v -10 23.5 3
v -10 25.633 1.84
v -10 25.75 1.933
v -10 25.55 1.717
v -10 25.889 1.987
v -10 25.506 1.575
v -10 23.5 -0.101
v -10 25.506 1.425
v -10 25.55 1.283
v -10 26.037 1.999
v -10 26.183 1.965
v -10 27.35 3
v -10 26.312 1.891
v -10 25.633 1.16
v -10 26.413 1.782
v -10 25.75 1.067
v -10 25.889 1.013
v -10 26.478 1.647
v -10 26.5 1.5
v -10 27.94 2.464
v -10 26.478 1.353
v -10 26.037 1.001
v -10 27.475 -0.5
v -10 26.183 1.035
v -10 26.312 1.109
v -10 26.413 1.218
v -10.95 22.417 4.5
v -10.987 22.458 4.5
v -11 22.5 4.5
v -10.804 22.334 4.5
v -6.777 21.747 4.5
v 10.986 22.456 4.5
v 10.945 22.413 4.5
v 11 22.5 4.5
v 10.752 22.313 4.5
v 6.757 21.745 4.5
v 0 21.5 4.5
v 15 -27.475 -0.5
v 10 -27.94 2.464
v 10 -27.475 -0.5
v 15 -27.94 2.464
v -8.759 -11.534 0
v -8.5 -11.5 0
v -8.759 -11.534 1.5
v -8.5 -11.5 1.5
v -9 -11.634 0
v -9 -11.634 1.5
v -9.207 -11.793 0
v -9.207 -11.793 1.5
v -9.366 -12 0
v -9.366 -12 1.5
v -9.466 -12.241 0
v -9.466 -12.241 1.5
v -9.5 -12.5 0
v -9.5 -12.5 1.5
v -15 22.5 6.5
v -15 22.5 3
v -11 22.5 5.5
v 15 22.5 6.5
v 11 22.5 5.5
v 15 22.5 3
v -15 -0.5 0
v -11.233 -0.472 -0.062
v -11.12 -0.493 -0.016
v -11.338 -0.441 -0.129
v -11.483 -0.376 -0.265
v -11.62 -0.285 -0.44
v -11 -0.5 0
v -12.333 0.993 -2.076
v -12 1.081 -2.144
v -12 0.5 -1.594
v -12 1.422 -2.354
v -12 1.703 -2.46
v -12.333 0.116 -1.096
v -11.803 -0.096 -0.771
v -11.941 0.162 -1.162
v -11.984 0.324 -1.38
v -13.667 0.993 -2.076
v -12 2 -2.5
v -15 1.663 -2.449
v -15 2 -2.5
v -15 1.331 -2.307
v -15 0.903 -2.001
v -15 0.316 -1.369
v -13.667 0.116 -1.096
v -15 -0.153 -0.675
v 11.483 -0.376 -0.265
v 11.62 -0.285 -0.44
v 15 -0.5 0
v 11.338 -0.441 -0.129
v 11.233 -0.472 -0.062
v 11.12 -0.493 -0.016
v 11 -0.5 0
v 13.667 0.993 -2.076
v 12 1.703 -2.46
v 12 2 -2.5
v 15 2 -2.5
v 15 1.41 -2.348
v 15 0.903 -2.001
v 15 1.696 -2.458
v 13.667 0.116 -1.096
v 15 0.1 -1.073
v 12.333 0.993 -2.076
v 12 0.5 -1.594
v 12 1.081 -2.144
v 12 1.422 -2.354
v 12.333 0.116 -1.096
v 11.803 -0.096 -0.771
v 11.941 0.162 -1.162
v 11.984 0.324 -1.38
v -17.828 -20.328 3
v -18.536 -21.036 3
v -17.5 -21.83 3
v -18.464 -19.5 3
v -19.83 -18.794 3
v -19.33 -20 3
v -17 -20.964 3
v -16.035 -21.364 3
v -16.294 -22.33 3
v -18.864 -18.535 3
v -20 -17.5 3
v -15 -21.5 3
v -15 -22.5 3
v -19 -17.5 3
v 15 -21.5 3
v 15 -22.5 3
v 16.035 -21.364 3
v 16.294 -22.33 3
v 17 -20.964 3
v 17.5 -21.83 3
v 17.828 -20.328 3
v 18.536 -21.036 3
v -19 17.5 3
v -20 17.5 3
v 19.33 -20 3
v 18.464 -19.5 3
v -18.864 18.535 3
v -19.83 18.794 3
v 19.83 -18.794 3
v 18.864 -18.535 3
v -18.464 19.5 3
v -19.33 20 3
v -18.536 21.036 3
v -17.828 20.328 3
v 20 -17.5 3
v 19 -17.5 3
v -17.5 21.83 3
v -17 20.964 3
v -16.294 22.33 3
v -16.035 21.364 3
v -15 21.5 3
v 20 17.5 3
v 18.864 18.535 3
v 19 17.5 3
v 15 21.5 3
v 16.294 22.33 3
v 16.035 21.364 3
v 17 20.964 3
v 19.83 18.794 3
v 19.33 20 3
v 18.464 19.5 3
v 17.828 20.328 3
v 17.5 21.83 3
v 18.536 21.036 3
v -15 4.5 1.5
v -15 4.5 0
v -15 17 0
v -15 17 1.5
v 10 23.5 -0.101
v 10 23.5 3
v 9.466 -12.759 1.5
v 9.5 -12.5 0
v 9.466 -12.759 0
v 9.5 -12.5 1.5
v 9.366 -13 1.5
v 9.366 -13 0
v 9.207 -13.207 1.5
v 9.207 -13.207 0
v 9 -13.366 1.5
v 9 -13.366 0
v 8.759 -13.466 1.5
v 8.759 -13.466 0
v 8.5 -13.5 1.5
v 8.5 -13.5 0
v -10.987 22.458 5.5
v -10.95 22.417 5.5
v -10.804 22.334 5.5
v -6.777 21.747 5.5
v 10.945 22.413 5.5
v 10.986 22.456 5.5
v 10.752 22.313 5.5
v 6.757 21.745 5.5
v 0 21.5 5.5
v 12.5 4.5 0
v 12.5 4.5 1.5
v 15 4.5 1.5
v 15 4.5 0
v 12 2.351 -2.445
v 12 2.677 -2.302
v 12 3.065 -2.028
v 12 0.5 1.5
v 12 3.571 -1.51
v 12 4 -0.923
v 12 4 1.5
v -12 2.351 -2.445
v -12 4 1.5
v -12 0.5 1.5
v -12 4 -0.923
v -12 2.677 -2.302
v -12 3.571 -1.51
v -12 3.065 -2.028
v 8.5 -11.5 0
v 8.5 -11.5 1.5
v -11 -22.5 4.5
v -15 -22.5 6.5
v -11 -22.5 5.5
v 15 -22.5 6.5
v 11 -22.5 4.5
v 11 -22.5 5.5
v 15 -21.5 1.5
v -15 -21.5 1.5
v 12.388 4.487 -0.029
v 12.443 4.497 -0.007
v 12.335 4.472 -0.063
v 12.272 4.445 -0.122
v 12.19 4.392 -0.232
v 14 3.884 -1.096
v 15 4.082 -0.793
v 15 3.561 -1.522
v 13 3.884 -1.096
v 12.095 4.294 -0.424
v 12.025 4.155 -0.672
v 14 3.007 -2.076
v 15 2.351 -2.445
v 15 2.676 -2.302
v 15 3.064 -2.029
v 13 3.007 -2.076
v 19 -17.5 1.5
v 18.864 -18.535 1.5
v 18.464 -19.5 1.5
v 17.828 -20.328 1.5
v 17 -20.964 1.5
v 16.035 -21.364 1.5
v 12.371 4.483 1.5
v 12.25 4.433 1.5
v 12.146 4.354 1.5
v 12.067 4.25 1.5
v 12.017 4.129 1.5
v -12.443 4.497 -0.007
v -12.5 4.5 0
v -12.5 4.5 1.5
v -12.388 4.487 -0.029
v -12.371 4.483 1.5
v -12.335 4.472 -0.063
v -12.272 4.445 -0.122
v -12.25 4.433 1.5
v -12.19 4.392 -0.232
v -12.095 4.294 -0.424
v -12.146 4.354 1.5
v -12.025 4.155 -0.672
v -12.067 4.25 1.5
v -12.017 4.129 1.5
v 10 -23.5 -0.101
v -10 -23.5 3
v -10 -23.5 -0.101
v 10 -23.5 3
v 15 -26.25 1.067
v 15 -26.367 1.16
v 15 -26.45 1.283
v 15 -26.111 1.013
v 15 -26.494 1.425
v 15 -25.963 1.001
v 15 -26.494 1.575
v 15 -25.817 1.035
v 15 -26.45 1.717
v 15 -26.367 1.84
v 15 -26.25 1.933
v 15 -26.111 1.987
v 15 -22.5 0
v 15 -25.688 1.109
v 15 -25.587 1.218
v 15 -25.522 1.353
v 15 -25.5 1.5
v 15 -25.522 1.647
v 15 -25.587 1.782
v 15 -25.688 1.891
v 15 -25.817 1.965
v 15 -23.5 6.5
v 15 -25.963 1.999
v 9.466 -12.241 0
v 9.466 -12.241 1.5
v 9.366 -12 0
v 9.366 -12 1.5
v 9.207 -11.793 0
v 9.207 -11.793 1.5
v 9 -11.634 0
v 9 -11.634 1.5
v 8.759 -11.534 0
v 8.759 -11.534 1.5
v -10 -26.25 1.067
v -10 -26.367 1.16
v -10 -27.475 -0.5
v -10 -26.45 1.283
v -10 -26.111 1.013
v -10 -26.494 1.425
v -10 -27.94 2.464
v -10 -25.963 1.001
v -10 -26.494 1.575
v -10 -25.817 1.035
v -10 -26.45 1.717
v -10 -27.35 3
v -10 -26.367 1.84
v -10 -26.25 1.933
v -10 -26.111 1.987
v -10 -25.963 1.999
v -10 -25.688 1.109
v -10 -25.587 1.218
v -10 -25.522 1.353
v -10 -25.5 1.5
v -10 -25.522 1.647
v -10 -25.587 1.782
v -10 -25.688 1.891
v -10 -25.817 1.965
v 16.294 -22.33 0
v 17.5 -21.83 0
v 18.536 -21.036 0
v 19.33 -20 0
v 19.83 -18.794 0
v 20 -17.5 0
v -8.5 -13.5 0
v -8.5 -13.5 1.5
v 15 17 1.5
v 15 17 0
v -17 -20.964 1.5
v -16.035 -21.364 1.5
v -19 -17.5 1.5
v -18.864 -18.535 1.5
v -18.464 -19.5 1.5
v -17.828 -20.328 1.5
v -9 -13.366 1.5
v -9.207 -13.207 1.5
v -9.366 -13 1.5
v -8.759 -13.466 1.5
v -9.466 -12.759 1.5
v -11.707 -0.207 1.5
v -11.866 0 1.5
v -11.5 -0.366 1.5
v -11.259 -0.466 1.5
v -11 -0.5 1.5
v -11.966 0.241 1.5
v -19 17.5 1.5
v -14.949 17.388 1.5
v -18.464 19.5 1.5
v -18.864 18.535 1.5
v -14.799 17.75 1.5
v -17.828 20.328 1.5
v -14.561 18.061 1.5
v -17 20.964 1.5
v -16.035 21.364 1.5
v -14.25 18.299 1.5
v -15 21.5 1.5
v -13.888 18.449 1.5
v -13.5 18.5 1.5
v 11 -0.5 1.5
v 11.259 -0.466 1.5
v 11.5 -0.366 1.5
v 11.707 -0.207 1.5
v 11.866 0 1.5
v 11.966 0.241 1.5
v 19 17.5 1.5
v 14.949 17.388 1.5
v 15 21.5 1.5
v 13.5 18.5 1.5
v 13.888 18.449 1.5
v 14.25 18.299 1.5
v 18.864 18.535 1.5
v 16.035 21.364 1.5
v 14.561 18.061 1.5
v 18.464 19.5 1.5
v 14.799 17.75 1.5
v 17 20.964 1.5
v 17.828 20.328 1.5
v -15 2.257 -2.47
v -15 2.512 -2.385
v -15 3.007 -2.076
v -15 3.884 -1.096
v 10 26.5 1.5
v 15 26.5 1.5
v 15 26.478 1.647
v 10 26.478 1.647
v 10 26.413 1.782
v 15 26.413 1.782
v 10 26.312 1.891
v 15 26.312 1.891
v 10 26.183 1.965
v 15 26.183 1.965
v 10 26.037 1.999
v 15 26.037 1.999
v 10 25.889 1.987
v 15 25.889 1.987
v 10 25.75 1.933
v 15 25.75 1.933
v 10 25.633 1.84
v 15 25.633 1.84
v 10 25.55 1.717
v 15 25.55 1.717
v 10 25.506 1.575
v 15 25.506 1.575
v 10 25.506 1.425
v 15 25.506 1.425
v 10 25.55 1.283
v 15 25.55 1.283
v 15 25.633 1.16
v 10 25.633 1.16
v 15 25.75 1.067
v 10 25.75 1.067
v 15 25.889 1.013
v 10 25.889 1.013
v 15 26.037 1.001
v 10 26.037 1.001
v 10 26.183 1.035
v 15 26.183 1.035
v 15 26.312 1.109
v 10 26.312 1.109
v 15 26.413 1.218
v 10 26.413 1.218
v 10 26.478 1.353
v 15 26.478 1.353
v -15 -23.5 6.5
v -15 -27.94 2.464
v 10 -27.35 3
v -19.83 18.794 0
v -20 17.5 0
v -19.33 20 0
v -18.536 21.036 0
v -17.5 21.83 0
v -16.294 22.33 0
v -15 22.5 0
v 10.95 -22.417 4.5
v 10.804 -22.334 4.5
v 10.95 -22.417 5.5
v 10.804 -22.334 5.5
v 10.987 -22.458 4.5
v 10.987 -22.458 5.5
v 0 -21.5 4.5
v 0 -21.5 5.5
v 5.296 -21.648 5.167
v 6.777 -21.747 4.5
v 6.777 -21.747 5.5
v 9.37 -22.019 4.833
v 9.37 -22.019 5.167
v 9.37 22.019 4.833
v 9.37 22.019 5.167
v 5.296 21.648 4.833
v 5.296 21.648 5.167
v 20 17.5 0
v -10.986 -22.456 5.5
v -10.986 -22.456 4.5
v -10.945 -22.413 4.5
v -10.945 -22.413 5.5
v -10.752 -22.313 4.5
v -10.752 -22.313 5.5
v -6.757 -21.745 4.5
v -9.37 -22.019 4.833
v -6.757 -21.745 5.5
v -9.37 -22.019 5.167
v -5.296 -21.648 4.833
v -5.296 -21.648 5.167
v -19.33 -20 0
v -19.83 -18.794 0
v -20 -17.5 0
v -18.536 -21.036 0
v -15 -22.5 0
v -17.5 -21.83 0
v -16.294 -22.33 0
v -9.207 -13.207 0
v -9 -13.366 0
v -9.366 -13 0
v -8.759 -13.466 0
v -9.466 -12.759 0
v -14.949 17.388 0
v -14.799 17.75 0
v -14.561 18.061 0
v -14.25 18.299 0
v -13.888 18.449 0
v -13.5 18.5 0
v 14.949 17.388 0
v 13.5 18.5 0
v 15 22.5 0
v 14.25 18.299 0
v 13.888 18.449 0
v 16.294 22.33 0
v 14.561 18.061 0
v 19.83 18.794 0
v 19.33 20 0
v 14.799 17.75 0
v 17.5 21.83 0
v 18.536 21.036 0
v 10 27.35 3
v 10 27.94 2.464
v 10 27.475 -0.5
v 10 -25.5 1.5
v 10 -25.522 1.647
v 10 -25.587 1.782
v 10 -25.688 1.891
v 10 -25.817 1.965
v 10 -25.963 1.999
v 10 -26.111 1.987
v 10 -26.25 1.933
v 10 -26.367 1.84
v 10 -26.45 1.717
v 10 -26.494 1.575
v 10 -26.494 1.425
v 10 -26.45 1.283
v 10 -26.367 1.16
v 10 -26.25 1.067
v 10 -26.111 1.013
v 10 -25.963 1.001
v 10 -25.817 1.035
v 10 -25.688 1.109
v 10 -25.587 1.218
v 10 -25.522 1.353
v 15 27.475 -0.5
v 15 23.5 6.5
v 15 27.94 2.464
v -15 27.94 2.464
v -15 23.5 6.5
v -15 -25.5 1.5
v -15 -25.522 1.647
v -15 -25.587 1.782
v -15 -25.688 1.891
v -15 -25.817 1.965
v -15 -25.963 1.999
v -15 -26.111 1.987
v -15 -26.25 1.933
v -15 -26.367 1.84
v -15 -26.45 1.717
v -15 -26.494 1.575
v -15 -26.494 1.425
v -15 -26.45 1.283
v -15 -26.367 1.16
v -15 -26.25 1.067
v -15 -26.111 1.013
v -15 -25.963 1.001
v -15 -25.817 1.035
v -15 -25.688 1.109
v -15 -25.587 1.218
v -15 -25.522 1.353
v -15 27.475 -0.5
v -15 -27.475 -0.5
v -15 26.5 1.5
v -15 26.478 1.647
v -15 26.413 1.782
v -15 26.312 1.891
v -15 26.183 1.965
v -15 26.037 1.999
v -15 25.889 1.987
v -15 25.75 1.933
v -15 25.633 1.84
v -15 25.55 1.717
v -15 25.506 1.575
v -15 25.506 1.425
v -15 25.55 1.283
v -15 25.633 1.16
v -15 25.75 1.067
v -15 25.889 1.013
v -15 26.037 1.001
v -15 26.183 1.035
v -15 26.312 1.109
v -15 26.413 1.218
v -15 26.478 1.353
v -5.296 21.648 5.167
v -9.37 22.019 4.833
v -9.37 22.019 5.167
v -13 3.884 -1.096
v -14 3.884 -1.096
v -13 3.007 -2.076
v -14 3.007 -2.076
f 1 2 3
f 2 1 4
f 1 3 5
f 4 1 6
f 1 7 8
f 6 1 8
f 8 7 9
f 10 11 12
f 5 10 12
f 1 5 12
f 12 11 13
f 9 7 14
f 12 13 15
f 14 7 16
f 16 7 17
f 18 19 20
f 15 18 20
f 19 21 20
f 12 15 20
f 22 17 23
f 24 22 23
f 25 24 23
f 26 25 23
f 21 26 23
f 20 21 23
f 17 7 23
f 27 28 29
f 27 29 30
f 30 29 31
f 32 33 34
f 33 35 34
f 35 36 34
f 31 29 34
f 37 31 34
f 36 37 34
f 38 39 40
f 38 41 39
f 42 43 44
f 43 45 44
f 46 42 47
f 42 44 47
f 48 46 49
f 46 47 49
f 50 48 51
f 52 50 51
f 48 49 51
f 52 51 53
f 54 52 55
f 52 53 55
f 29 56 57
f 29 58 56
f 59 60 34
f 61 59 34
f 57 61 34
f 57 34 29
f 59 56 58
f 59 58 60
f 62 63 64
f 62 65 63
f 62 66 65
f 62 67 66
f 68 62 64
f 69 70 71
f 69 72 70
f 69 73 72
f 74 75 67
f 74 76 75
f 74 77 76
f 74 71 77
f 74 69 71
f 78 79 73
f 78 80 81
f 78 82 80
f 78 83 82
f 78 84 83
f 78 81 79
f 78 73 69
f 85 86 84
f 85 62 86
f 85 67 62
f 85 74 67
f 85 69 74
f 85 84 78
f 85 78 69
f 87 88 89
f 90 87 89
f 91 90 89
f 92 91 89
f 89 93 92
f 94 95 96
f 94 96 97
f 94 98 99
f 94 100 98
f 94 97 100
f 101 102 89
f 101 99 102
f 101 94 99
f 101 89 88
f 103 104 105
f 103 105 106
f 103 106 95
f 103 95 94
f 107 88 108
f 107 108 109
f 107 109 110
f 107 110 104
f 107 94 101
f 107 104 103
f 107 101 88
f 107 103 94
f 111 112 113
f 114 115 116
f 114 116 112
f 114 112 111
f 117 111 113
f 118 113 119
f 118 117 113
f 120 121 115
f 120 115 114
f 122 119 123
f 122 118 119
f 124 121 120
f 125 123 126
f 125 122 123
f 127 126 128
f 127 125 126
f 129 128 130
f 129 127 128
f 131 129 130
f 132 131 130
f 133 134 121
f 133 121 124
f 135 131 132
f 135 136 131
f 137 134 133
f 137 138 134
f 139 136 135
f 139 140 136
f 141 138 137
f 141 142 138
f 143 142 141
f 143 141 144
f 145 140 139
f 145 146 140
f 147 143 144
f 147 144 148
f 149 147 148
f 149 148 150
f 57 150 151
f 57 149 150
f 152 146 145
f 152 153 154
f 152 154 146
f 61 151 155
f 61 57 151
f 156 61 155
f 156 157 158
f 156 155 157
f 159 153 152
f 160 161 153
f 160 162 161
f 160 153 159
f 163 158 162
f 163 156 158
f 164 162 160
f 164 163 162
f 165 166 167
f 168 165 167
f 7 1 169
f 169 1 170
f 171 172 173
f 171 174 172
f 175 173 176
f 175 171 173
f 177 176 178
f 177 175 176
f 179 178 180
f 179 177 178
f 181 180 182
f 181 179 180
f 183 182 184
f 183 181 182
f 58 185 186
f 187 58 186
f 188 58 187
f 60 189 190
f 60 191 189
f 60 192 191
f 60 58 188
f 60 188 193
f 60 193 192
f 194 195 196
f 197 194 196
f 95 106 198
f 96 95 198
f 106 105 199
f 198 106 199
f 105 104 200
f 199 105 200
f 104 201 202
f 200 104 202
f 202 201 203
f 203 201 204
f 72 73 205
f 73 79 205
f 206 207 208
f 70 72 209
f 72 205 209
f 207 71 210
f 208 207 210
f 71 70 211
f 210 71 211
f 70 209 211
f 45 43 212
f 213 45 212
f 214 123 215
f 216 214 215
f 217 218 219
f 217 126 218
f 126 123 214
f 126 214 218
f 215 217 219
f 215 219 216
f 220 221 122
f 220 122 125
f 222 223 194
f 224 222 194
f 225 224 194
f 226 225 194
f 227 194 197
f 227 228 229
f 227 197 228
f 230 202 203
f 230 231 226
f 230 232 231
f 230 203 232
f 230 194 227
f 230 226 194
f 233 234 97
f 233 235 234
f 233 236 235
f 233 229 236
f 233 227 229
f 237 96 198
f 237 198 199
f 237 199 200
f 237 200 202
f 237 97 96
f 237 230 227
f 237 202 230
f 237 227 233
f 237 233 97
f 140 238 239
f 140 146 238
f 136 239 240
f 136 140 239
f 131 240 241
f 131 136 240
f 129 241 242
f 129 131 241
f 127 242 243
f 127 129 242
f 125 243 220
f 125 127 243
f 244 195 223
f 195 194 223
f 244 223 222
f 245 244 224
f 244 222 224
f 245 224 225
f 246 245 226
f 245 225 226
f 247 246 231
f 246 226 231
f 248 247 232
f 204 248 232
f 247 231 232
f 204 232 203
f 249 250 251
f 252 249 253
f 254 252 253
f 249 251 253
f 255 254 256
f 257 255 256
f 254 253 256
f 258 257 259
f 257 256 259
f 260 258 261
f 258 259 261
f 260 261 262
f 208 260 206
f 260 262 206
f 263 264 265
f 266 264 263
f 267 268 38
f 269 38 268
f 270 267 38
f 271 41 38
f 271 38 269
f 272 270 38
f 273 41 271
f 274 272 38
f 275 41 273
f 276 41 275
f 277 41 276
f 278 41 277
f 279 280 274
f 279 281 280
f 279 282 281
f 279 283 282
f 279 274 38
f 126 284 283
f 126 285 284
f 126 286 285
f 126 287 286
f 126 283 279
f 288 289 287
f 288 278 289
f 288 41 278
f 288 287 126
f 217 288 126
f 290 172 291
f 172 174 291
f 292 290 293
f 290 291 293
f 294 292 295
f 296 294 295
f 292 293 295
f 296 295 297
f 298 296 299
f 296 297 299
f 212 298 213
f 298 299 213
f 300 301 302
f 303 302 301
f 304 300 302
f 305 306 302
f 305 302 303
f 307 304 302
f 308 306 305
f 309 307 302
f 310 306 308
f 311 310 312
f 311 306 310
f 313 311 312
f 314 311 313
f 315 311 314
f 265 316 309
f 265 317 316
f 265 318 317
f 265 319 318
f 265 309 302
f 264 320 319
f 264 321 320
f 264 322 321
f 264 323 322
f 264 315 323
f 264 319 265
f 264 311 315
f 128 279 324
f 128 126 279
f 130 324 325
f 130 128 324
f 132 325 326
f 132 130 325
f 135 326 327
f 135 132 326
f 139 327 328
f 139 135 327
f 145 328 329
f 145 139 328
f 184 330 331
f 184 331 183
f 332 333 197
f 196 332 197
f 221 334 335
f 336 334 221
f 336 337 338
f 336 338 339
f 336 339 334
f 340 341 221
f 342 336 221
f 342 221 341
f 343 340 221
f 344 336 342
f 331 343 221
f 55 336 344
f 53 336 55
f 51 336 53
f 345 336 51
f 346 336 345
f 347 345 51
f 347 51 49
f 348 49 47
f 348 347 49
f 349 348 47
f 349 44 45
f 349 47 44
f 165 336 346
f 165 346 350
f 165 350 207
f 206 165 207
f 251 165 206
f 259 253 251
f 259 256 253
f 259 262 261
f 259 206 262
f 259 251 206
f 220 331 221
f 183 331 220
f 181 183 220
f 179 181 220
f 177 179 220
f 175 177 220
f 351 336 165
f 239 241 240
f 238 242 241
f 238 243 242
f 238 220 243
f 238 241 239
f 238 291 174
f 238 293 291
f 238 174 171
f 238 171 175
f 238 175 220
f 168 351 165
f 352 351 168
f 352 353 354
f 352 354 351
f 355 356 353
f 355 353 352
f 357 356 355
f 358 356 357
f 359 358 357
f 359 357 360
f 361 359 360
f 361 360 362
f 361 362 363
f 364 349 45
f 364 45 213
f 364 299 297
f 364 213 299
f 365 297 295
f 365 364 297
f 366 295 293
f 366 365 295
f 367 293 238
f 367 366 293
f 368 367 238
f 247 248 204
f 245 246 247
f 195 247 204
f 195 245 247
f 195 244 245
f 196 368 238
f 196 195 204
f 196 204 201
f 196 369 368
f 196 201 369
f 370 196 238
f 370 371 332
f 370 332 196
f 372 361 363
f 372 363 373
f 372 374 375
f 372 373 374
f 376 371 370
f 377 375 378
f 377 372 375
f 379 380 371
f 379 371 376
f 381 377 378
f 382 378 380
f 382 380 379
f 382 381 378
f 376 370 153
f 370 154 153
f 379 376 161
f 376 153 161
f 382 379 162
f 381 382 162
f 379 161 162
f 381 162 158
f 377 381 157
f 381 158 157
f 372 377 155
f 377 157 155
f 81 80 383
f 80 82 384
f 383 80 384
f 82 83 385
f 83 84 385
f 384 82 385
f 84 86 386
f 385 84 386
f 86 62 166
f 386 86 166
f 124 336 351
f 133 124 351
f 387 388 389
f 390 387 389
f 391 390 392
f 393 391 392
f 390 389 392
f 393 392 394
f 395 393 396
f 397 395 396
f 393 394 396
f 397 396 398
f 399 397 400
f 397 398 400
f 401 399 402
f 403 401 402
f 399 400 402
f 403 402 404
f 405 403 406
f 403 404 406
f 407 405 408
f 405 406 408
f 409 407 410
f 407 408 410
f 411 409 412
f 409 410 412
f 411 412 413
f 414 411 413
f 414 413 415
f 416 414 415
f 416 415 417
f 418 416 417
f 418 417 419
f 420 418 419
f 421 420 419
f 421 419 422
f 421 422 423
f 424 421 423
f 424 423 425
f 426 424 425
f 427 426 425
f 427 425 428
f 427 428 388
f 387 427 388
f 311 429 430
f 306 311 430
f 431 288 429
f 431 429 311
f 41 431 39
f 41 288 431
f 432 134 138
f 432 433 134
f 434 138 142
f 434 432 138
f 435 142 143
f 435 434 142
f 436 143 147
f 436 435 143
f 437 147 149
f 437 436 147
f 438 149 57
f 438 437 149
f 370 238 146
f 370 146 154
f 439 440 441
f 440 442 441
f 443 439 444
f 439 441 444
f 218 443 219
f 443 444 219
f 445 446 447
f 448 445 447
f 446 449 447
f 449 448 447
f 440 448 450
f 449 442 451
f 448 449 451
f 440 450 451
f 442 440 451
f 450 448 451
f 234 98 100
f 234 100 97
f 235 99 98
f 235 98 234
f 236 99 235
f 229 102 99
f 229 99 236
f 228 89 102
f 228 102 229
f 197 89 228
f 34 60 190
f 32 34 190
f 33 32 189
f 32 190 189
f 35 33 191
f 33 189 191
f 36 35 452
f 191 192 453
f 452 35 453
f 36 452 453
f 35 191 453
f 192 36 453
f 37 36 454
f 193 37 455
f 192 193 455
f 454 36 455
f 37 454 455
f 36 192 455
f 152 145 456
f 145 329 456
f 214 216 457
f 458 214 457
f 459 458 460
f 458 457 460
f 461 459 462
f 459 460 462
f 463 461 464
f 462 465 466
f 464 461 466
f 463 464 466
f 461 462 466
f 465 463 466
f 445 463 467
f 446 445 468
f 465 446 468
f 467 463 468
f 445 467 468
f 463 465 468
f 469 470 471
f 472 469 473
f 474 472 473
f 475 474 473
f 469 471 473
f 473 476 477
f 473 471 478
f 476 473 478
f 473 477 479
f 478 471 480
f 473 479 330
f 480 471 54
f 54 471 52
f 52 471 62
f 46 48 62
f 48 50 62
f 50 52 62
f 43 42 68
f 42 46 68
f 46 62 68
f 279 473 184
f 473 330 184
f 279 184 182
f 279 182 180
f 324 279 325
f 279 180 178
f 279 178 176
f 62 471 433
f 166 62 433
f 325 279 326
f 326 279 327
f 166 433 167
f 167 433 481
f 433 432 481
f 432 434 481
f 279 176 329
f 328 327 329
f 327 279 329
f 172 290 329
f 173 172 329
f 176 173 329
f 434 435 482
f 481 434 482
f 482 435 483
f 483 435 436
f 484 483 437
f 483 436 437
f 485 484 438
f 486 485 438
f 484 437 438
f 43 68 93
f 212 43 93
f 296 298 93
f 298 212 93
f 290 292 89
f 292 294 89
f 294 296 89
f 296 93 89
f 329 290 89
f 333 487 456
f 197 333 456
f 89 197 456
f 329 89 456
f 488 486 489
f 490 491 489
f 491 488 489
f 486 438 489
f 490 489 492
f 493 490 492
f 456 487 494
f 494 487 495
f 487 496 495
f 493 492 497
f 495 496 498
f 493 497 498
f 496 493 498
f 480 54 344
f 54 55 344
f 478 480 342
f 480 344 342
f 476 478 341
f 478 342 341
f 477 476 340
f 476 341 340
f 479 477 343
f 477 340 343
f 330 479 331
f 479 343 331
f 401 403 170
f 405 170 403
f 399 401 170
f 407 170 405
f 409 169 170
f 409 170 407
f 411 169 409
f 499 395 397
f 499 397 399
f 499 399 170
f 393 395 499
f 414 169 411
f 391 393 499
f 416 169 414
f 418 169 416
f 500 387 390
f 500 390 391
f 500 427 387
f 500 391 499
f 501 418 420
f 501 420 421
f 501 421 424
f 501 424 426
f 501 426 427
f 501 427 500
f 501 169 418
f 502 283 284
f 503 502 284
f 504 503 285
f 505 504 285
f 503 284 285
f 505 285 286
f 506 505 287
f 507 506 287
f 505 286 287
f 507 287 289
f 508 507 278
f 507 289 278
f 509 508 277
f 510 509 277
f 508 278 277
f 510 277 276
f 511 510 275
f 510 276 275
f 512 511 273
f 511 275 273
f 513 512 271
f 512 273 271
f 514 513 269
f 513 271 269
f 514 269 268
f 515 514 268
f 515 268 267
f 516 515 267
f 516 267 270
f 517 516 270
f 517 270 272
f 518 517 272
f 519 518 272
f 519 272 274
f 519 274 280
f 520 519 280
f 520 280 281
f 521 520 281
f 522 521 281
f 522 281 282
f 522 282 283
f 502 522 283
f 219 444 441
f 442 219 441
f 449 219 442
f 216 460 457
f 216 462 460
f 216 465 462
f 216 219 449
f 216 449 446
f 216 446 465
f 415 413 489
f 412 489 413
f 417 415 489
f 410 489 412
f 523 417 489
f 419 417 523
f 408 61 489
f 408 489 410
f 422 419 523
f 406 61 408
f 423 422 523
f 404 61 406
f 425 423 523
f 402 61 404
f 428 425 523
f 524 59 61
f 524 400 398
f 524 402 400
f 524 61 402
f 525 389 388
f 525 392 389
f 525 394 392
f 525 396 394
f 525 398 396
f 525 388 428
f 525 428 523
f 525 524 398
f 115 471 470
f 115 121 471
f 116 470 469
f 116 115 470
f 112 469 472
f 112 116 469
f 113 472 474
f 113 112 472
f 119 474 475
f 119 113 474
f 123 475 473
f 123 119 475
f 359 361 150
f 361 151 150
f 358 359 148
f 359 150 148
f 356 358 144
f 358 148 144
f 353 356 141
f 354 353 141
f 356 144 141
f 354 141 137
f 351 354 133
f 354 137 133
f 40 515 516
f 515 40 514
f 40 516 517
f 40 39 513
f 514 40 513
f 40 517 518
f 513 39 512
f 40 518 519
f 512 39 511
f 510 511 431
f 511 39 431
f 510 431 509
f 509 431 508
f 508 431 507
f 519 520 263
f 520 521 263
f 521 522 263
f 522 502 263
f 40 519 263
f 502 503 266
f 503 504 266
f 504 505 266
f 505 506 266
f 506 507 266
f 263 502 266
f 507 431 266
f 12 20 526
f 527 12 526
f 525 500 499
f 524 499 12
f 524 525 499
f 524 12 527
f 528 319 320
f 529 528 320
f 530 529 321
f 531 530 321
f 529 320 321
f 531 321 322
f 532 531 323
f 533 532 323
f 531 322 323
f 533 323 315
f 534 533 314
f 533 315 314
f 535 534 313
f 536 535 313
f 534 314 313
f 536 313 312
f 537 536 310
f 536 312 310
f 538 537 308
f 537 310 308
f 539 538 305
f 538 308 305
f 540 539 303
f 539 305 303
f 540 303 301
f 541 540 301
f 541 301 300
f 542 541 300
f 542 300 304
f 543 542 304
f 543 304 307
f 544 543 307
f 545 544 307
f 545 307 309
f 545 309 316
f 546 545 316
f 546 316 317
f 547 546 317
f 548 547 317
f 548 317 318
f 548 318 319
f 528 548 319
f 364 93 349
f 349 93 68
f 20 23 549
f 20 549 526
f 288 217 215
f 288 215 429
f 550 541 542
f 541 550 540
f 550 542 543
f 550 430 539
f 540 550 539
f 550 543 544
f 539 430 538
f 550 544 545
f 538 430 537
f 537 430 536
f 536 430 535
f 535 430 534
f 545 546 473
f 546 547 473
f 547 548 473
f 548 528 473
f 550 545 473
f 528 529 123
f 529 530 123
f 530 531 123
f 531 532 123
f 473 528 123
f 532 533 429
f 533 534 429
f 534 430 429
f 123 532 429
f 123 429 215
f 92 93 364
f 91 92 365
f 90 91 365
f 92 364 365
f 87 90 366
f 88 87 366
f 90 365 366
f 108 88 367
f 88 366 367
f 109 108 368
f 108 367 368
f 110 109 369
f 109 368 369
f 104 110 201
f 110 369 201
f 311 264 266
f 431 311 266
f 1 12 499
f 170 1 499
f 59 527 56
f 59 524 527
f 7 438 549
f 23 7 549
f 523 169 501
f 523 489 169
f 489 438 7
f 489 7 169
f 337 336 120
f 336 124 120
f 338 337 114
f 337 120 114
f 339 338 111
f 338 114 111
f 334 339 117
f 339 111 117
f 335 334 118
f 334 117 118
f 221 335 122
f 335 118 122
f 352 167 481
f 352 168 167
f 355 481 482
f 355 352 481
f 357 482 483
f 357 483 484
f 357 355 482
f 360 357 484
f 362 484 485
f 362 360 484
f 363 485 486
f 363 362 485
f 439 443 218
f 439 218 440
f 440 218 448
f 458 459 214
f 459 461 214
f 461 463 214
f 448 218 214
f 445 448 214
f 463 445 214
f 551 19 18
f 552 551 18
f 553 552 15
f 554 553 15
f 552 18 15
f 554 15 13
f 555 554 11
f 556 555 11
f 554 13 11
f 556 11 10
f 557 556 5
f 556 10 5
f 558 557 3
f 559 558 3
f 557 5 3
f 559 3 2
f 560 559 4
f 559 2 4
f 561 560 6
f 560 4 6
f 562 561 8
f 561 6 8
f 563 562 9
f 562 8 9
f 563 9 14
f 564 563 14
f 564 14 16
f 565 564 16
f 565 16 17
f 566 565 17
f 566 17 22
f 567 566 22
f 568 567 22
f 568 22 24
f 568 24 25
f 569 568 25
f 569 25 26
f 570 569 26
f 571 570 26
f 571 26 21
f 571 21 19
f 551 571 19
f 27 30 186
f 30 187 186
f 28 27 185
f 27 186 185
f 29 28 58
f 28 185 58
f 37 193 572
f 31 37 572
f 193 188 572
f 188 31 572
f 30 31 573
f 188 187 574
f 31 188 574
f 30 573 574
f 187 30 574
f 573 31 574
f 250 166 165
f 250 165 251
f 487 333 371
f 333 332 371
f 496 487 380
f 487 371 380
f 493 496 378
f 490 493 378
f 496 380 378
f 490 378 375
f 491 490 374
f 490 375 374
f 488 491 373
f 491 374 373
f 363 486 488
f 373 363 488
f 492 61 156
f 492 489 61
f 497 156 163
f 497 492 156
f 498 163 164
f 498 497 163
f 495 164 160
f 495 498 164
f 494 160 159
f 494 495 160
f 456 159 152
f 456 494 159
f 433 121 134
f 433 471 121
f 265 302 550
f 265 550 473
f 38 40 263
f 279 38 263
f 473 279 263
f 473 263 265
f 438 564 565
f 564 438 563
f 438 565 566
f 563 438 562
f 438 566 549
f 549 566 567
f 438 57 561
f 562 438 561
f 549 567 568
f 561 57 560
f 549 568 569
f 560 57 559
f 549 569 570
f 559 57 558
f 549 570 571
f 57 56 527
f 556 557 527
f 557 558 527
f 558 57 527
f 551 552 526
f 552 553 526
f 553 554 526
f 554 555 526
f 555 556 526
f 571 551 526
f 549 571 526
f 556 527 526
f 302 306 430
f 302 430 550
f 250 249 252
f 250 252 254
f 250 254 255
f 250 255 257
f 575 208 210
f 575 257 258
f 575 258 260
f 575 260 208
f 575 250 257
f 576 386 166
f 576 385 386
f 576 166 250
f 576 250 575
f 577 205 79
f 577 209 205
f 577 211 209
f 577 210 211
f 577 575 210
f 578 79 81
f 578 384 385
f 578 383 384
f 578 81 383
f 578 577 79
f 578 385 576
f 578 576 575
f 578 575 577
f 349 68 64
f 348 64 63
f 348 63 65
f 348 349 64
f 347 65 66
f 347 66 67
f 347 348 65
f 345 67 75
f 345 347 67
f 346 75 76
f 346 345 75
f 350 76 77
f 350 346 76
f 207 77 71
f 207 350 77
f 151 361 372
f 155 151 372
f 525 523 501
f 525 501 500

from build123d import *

# Parameters (mm, degrees)
F0_W           = 40
F0_H           = 45
F0_W_2         = 19
F0_H_2         = 2
F0_W_3         = 3
F0_H_3         = 5
F1_DEPTH       = 1.5
F2_DEPTH       = 2.5
F4_DEPTH       = 50
F5_R           = 0.99999
F6_R           = 1.5
F7_R           = 1
F8_R           = 0.5
F9_W           = 40
F9_H           = 45
F9_W_2         = 38
F9_H_2         = 43
F10_DEPTH      = 3
F11_R          = 4
F12_R          = 5
F14_DEPTH      = 15
F14_DEPTH_BACK = 15
F15_W          = 22
F15_H          = 1
F16_DEPTH      = 1
F18_DEPTH      = 1
F19_W          = 22
F19_H          = 1
F20_DEPTH      = 1
F22_DEPTH      = 1
F23_R          = 0.5
F24_DEPTH      = 30
F25_R          = 0.5
F26_DEPTH      = 30
F27_W          = 20
F27_H          = 6
F28_DEPTH      = 3
F28_DEPTH_BACK = 2


# Not quite as in the source:
# - a fillet or chamfer is up to 0.001 mm smaller than in the source, because OpenCascade refuses the exact size


with BuildPart() as f1:
    # F0 (on Top) → F1 (new body)
    with BuildSketch(Plane.XY):
        Rectangle(F0_W, F0_H)
        with Locations((0, -12.5)):
            Rectangle(F0_W_2, F0_H_2, mode=Mode.SUBTRACT)
        Polygon((-15, -0.5), (-15, 4.5), (-15, 18.5), (15, 18.5), (15, 4.5), (15, -0.5), (12, -0.5), (-12, -0.5), align=None, mode=Mode.SUBTRACT)
        with Locations((-13.5, 2)):
            Rectangle(F0_W_3, F0_H_3)
        with Locations((13.5, 2)):
            Rectangle(F0_W_3, F0_H_3)
    extrude(amount=F1_DEPTH)

    # F0 (on Top) → F2 (join)
    with BuildSketch(Plane.XY):
        with Locations((13.5, 2)):
            Rectangle(F0_W_3, F0_H_3)
        with Locations((-13.5, 2)):
            Rectangle(F0_W_3, F0_H_3)
    extrude(amount=-F2_DEPTH)

    # F3 (on face) → F4 (cut)
    with BuildSketch(Plane(origin=(-15, 0, 0), x_dir=(0, -1, 0), z_dir=(-1, 0, 0))):
        with BuildLine():
            add(Edge.make_bspline(
                [(-4.5, 0), (-4.0582373844, -1.0078166901), (-3.0291186922, -2.5), (-2, -2.5)],
                knots=[0, 0, 0, 0, 0.1816780837, 0.1816780837, 0.1816780837, 0.1816780837], degree=3))
            Line((-4.5, 0), (-4.5, -2.5))
            Line((-4.5, -2.5), (-2, -2.5))
        make_face()
        with BuildLine():
            Line((0.5, -2.5), (0.5, 0))
            add(Edge.make_bspline(
                [(-2, -2.5), (-0.9708813078, -2.5), (0.0582373844, -1.0078166901), (0.5, 0)],
                knots=[0.1816780837, 0.1816780837, 0.1816780837, 0.1816780837, 0.3633561673, 0.3633561673, 0.3633561673, 0.3633561673], degree=3))
            Line((-2, -2.5), (0.5, -2.5))
        make_face()
    extrude(amount=-F4_DEPTH, mode=Mode.SUBTRACT)

    # F5 (radius 1 in the source; OpenCascade refuses exactly that, so slightly less here)
    f5_edges = [f1.edges().sort_by_distance(p)[0] for p in [
        (9.5, -11.5, 0.75),
        (9.5, -13.5, 0.75),
        (-9.5, -11.5, 0.75),
        (-9.5, -13.5, 0.75),
    ]]
    fillet(f5_edges, radius=F5_R)

    # F6
    f6_edges = [f1.edges().sort_by_distance(p)[0] for p in [
        (-15, 18.5, 0.75),
        (15, 18.5, 0.75),
    ]]
    fillet(f6_edges, radius=F6_R)

    # F7
    f7_edges = [f1.edges().sort_by_distance(p)[0] for p in [
        (12, -0.5, 0.75),
        (-12, -0.5, 0.75),
    ]]
    fillet(f7_edges, radius=F7_R)

    # F8
    f8_edges = [f1.edges().sort_by_distance(p)[0] for p in [
        (12, 4.5, 0.75),
        (-12, 4.5, 0.75),
    ]]
    fillet(f8_edges, radius=F8_R)

    # F9 (on Top) → F10 (join)
    with BuildSketch(Plane.XY):
        Rectangle(F9_W, F9_H)
        Rectangle(F9_W_2, F9_H_2, mode=Mode.SUBTRACT)
    extrude(amount=F10_DEPTH)

    # F11
    f11_edges = [f1.edges().sort_by_distance(p)[0] for p in [
        (-19, 21.5, 2.25),
        (19, 21.5, 2.25),
        (19, -21.5, 2.25),
        (-19, -21.5, 2.25),
    ]]
    fillet(f11_edges, radius=F11_R)

    # F12
    f12_edges = [f1.edges().sort_by_distance(p)[0] for p in [
        (-20, -22.5, 1.5),
        (20, -22.5, 1.5),
        (20, 22.5, 1.5),
        (-20, 22.5, 1.5),
    ]]
    fillet(f12_edges, radius=F12_R)

    # F13 (on Right) → F14 (join, two sides)
    with BuildSketch(Plane.YZ) as f14_sk:
        Polygon((22.5, 6.5), (22.5, 0), (27.4749371855, -0.5), (27.9395025565, 2.4638115689), (23.5, 6.5), align=None)
        Polygon((-27.4749371855, -0.5), (-22.5, 0), (-22.5, 6.5), (-23.5, 6.5), (-27.9395025565, 2.4638115689), align=None)
    extrude(amount=F14_DEPTH)
    extrude(f14_sk.sketch, amount=-F14_DEPTH_BACK)

    # F15 (on face) → F16 (join)
    with BuildSketch(Plane.XZ.offset(-22.5)):
        with Locations((0, 5)):
            Rectangle(F15_W, F15_H)
    extrude(amount=F16_DEPTH)

    # F17 (on face) → F18 (cut)
    with BuildSketch(Plane.XY.offset(5.5)):
        with BuildLine():
            Line((-11, 21.5), (0, 21.5))
            add(Edge.make_bspline(
                [(0, 21.5), (-5.5, 21.5), (-11, 22), (-11, 22.5)],
                knots=[0, 0, 0, 0, 0.25, 0.25, 0.25, 0.25], degree=3))
            Line((-11, 22.5), (-11, 21.5))
        make_face()
        with BuildLine():
            add(Edge.make_bspline(
                [(11, 22.5), (11, 22), (5.5, 21.5), (0, 21.5)],
                knots=[0.75, 0.75, 0.75, 0.75, 1, 1, 1, 1], degree=3))
            Line((0, 21.5), (11, 21.5))
            Line((11, 21.5), (11, 22.5))
        make_face()
    extrude(amount=-F18_DEPTH, mode=Mode.SUBTRACT)

    # F19 (on face) → F20 (join)
    with BuildSketch(Plane(origin=(0, -22.5, 0), x_dir=(-1, 0, 0), z_dir=(0, 1, 0))):
        with Locations((0, 5)):
            Rectangle(F19_W, F19_H)
    extrude(amount=F20_DEPTH)

    # F21 (on face) → F22 (cut)
    with BuildSketch(Plane.XY.offset(5.5)):
        with BuildLine():
            Line((11, -21.5), (0, -21.5))
            add(Edge.make_bspline(
                [(0, -21.5), (5.5, -21.5), (11, -22), (11, -22.5)],
                knots=[0, 0, 0, 0, 0.25, 0.25, 0.25, 0.25], degree=3))
            Line((11, -22.5), (11, -21.5))
        make_face()
        with BuildLine():
            add(Edge.make_bspline(
                [(-11, -22.5), (-11, -22), (-5.5, -21.5), (0, -21.5)],
                knots=[0.75, 0.75, 0.75, 0.75, 1, 1, 1, 1], degree=3))
            Line((0, -21.5), (-11, -21.5))
            Line((-11, -21.5), (-11, -22.5))
        make_face()
    extrude(amount=-F22_DEPTH, mode=Mode.SUBTRACT)

    # F23 (on face) → F24 (cut)
    with BuildSketch(Plane.YZ.offset(15)):
        with Locations((26, 1.5)):
            Circle(F23_R)
    extrude(amount=-F24_DEPTH, mode=Mode.SUBTRACT)

    # F25 (on face) → F26 (cut)
    with BuildSketch(Plane.YZ.offset(15)):
        with Locations((-26, 1.5)):
            Circle(F25_R)
    extrude(amount=-F26_DEPTH, mode=Mode.SUBTRACT)

    # F27 (on Top) → F28 (cut, two sides)
    with BuildSketch(Plane.XY) as f28_sk:
        with Locations((0, 26.5)):
            Rectangle(F27_W, F27_H)
        with Locations((0, -26.5)):
            Rectangle(F27_W, F27_H)
    extrude(amount=F28_DEPTH, mode=Mode.SUBTRACT)
    extrude(f28_sk.sketch, amount=-F28_DEPTH_BACK, mode=Mode.SUBTRACT)


solid = f1.part
